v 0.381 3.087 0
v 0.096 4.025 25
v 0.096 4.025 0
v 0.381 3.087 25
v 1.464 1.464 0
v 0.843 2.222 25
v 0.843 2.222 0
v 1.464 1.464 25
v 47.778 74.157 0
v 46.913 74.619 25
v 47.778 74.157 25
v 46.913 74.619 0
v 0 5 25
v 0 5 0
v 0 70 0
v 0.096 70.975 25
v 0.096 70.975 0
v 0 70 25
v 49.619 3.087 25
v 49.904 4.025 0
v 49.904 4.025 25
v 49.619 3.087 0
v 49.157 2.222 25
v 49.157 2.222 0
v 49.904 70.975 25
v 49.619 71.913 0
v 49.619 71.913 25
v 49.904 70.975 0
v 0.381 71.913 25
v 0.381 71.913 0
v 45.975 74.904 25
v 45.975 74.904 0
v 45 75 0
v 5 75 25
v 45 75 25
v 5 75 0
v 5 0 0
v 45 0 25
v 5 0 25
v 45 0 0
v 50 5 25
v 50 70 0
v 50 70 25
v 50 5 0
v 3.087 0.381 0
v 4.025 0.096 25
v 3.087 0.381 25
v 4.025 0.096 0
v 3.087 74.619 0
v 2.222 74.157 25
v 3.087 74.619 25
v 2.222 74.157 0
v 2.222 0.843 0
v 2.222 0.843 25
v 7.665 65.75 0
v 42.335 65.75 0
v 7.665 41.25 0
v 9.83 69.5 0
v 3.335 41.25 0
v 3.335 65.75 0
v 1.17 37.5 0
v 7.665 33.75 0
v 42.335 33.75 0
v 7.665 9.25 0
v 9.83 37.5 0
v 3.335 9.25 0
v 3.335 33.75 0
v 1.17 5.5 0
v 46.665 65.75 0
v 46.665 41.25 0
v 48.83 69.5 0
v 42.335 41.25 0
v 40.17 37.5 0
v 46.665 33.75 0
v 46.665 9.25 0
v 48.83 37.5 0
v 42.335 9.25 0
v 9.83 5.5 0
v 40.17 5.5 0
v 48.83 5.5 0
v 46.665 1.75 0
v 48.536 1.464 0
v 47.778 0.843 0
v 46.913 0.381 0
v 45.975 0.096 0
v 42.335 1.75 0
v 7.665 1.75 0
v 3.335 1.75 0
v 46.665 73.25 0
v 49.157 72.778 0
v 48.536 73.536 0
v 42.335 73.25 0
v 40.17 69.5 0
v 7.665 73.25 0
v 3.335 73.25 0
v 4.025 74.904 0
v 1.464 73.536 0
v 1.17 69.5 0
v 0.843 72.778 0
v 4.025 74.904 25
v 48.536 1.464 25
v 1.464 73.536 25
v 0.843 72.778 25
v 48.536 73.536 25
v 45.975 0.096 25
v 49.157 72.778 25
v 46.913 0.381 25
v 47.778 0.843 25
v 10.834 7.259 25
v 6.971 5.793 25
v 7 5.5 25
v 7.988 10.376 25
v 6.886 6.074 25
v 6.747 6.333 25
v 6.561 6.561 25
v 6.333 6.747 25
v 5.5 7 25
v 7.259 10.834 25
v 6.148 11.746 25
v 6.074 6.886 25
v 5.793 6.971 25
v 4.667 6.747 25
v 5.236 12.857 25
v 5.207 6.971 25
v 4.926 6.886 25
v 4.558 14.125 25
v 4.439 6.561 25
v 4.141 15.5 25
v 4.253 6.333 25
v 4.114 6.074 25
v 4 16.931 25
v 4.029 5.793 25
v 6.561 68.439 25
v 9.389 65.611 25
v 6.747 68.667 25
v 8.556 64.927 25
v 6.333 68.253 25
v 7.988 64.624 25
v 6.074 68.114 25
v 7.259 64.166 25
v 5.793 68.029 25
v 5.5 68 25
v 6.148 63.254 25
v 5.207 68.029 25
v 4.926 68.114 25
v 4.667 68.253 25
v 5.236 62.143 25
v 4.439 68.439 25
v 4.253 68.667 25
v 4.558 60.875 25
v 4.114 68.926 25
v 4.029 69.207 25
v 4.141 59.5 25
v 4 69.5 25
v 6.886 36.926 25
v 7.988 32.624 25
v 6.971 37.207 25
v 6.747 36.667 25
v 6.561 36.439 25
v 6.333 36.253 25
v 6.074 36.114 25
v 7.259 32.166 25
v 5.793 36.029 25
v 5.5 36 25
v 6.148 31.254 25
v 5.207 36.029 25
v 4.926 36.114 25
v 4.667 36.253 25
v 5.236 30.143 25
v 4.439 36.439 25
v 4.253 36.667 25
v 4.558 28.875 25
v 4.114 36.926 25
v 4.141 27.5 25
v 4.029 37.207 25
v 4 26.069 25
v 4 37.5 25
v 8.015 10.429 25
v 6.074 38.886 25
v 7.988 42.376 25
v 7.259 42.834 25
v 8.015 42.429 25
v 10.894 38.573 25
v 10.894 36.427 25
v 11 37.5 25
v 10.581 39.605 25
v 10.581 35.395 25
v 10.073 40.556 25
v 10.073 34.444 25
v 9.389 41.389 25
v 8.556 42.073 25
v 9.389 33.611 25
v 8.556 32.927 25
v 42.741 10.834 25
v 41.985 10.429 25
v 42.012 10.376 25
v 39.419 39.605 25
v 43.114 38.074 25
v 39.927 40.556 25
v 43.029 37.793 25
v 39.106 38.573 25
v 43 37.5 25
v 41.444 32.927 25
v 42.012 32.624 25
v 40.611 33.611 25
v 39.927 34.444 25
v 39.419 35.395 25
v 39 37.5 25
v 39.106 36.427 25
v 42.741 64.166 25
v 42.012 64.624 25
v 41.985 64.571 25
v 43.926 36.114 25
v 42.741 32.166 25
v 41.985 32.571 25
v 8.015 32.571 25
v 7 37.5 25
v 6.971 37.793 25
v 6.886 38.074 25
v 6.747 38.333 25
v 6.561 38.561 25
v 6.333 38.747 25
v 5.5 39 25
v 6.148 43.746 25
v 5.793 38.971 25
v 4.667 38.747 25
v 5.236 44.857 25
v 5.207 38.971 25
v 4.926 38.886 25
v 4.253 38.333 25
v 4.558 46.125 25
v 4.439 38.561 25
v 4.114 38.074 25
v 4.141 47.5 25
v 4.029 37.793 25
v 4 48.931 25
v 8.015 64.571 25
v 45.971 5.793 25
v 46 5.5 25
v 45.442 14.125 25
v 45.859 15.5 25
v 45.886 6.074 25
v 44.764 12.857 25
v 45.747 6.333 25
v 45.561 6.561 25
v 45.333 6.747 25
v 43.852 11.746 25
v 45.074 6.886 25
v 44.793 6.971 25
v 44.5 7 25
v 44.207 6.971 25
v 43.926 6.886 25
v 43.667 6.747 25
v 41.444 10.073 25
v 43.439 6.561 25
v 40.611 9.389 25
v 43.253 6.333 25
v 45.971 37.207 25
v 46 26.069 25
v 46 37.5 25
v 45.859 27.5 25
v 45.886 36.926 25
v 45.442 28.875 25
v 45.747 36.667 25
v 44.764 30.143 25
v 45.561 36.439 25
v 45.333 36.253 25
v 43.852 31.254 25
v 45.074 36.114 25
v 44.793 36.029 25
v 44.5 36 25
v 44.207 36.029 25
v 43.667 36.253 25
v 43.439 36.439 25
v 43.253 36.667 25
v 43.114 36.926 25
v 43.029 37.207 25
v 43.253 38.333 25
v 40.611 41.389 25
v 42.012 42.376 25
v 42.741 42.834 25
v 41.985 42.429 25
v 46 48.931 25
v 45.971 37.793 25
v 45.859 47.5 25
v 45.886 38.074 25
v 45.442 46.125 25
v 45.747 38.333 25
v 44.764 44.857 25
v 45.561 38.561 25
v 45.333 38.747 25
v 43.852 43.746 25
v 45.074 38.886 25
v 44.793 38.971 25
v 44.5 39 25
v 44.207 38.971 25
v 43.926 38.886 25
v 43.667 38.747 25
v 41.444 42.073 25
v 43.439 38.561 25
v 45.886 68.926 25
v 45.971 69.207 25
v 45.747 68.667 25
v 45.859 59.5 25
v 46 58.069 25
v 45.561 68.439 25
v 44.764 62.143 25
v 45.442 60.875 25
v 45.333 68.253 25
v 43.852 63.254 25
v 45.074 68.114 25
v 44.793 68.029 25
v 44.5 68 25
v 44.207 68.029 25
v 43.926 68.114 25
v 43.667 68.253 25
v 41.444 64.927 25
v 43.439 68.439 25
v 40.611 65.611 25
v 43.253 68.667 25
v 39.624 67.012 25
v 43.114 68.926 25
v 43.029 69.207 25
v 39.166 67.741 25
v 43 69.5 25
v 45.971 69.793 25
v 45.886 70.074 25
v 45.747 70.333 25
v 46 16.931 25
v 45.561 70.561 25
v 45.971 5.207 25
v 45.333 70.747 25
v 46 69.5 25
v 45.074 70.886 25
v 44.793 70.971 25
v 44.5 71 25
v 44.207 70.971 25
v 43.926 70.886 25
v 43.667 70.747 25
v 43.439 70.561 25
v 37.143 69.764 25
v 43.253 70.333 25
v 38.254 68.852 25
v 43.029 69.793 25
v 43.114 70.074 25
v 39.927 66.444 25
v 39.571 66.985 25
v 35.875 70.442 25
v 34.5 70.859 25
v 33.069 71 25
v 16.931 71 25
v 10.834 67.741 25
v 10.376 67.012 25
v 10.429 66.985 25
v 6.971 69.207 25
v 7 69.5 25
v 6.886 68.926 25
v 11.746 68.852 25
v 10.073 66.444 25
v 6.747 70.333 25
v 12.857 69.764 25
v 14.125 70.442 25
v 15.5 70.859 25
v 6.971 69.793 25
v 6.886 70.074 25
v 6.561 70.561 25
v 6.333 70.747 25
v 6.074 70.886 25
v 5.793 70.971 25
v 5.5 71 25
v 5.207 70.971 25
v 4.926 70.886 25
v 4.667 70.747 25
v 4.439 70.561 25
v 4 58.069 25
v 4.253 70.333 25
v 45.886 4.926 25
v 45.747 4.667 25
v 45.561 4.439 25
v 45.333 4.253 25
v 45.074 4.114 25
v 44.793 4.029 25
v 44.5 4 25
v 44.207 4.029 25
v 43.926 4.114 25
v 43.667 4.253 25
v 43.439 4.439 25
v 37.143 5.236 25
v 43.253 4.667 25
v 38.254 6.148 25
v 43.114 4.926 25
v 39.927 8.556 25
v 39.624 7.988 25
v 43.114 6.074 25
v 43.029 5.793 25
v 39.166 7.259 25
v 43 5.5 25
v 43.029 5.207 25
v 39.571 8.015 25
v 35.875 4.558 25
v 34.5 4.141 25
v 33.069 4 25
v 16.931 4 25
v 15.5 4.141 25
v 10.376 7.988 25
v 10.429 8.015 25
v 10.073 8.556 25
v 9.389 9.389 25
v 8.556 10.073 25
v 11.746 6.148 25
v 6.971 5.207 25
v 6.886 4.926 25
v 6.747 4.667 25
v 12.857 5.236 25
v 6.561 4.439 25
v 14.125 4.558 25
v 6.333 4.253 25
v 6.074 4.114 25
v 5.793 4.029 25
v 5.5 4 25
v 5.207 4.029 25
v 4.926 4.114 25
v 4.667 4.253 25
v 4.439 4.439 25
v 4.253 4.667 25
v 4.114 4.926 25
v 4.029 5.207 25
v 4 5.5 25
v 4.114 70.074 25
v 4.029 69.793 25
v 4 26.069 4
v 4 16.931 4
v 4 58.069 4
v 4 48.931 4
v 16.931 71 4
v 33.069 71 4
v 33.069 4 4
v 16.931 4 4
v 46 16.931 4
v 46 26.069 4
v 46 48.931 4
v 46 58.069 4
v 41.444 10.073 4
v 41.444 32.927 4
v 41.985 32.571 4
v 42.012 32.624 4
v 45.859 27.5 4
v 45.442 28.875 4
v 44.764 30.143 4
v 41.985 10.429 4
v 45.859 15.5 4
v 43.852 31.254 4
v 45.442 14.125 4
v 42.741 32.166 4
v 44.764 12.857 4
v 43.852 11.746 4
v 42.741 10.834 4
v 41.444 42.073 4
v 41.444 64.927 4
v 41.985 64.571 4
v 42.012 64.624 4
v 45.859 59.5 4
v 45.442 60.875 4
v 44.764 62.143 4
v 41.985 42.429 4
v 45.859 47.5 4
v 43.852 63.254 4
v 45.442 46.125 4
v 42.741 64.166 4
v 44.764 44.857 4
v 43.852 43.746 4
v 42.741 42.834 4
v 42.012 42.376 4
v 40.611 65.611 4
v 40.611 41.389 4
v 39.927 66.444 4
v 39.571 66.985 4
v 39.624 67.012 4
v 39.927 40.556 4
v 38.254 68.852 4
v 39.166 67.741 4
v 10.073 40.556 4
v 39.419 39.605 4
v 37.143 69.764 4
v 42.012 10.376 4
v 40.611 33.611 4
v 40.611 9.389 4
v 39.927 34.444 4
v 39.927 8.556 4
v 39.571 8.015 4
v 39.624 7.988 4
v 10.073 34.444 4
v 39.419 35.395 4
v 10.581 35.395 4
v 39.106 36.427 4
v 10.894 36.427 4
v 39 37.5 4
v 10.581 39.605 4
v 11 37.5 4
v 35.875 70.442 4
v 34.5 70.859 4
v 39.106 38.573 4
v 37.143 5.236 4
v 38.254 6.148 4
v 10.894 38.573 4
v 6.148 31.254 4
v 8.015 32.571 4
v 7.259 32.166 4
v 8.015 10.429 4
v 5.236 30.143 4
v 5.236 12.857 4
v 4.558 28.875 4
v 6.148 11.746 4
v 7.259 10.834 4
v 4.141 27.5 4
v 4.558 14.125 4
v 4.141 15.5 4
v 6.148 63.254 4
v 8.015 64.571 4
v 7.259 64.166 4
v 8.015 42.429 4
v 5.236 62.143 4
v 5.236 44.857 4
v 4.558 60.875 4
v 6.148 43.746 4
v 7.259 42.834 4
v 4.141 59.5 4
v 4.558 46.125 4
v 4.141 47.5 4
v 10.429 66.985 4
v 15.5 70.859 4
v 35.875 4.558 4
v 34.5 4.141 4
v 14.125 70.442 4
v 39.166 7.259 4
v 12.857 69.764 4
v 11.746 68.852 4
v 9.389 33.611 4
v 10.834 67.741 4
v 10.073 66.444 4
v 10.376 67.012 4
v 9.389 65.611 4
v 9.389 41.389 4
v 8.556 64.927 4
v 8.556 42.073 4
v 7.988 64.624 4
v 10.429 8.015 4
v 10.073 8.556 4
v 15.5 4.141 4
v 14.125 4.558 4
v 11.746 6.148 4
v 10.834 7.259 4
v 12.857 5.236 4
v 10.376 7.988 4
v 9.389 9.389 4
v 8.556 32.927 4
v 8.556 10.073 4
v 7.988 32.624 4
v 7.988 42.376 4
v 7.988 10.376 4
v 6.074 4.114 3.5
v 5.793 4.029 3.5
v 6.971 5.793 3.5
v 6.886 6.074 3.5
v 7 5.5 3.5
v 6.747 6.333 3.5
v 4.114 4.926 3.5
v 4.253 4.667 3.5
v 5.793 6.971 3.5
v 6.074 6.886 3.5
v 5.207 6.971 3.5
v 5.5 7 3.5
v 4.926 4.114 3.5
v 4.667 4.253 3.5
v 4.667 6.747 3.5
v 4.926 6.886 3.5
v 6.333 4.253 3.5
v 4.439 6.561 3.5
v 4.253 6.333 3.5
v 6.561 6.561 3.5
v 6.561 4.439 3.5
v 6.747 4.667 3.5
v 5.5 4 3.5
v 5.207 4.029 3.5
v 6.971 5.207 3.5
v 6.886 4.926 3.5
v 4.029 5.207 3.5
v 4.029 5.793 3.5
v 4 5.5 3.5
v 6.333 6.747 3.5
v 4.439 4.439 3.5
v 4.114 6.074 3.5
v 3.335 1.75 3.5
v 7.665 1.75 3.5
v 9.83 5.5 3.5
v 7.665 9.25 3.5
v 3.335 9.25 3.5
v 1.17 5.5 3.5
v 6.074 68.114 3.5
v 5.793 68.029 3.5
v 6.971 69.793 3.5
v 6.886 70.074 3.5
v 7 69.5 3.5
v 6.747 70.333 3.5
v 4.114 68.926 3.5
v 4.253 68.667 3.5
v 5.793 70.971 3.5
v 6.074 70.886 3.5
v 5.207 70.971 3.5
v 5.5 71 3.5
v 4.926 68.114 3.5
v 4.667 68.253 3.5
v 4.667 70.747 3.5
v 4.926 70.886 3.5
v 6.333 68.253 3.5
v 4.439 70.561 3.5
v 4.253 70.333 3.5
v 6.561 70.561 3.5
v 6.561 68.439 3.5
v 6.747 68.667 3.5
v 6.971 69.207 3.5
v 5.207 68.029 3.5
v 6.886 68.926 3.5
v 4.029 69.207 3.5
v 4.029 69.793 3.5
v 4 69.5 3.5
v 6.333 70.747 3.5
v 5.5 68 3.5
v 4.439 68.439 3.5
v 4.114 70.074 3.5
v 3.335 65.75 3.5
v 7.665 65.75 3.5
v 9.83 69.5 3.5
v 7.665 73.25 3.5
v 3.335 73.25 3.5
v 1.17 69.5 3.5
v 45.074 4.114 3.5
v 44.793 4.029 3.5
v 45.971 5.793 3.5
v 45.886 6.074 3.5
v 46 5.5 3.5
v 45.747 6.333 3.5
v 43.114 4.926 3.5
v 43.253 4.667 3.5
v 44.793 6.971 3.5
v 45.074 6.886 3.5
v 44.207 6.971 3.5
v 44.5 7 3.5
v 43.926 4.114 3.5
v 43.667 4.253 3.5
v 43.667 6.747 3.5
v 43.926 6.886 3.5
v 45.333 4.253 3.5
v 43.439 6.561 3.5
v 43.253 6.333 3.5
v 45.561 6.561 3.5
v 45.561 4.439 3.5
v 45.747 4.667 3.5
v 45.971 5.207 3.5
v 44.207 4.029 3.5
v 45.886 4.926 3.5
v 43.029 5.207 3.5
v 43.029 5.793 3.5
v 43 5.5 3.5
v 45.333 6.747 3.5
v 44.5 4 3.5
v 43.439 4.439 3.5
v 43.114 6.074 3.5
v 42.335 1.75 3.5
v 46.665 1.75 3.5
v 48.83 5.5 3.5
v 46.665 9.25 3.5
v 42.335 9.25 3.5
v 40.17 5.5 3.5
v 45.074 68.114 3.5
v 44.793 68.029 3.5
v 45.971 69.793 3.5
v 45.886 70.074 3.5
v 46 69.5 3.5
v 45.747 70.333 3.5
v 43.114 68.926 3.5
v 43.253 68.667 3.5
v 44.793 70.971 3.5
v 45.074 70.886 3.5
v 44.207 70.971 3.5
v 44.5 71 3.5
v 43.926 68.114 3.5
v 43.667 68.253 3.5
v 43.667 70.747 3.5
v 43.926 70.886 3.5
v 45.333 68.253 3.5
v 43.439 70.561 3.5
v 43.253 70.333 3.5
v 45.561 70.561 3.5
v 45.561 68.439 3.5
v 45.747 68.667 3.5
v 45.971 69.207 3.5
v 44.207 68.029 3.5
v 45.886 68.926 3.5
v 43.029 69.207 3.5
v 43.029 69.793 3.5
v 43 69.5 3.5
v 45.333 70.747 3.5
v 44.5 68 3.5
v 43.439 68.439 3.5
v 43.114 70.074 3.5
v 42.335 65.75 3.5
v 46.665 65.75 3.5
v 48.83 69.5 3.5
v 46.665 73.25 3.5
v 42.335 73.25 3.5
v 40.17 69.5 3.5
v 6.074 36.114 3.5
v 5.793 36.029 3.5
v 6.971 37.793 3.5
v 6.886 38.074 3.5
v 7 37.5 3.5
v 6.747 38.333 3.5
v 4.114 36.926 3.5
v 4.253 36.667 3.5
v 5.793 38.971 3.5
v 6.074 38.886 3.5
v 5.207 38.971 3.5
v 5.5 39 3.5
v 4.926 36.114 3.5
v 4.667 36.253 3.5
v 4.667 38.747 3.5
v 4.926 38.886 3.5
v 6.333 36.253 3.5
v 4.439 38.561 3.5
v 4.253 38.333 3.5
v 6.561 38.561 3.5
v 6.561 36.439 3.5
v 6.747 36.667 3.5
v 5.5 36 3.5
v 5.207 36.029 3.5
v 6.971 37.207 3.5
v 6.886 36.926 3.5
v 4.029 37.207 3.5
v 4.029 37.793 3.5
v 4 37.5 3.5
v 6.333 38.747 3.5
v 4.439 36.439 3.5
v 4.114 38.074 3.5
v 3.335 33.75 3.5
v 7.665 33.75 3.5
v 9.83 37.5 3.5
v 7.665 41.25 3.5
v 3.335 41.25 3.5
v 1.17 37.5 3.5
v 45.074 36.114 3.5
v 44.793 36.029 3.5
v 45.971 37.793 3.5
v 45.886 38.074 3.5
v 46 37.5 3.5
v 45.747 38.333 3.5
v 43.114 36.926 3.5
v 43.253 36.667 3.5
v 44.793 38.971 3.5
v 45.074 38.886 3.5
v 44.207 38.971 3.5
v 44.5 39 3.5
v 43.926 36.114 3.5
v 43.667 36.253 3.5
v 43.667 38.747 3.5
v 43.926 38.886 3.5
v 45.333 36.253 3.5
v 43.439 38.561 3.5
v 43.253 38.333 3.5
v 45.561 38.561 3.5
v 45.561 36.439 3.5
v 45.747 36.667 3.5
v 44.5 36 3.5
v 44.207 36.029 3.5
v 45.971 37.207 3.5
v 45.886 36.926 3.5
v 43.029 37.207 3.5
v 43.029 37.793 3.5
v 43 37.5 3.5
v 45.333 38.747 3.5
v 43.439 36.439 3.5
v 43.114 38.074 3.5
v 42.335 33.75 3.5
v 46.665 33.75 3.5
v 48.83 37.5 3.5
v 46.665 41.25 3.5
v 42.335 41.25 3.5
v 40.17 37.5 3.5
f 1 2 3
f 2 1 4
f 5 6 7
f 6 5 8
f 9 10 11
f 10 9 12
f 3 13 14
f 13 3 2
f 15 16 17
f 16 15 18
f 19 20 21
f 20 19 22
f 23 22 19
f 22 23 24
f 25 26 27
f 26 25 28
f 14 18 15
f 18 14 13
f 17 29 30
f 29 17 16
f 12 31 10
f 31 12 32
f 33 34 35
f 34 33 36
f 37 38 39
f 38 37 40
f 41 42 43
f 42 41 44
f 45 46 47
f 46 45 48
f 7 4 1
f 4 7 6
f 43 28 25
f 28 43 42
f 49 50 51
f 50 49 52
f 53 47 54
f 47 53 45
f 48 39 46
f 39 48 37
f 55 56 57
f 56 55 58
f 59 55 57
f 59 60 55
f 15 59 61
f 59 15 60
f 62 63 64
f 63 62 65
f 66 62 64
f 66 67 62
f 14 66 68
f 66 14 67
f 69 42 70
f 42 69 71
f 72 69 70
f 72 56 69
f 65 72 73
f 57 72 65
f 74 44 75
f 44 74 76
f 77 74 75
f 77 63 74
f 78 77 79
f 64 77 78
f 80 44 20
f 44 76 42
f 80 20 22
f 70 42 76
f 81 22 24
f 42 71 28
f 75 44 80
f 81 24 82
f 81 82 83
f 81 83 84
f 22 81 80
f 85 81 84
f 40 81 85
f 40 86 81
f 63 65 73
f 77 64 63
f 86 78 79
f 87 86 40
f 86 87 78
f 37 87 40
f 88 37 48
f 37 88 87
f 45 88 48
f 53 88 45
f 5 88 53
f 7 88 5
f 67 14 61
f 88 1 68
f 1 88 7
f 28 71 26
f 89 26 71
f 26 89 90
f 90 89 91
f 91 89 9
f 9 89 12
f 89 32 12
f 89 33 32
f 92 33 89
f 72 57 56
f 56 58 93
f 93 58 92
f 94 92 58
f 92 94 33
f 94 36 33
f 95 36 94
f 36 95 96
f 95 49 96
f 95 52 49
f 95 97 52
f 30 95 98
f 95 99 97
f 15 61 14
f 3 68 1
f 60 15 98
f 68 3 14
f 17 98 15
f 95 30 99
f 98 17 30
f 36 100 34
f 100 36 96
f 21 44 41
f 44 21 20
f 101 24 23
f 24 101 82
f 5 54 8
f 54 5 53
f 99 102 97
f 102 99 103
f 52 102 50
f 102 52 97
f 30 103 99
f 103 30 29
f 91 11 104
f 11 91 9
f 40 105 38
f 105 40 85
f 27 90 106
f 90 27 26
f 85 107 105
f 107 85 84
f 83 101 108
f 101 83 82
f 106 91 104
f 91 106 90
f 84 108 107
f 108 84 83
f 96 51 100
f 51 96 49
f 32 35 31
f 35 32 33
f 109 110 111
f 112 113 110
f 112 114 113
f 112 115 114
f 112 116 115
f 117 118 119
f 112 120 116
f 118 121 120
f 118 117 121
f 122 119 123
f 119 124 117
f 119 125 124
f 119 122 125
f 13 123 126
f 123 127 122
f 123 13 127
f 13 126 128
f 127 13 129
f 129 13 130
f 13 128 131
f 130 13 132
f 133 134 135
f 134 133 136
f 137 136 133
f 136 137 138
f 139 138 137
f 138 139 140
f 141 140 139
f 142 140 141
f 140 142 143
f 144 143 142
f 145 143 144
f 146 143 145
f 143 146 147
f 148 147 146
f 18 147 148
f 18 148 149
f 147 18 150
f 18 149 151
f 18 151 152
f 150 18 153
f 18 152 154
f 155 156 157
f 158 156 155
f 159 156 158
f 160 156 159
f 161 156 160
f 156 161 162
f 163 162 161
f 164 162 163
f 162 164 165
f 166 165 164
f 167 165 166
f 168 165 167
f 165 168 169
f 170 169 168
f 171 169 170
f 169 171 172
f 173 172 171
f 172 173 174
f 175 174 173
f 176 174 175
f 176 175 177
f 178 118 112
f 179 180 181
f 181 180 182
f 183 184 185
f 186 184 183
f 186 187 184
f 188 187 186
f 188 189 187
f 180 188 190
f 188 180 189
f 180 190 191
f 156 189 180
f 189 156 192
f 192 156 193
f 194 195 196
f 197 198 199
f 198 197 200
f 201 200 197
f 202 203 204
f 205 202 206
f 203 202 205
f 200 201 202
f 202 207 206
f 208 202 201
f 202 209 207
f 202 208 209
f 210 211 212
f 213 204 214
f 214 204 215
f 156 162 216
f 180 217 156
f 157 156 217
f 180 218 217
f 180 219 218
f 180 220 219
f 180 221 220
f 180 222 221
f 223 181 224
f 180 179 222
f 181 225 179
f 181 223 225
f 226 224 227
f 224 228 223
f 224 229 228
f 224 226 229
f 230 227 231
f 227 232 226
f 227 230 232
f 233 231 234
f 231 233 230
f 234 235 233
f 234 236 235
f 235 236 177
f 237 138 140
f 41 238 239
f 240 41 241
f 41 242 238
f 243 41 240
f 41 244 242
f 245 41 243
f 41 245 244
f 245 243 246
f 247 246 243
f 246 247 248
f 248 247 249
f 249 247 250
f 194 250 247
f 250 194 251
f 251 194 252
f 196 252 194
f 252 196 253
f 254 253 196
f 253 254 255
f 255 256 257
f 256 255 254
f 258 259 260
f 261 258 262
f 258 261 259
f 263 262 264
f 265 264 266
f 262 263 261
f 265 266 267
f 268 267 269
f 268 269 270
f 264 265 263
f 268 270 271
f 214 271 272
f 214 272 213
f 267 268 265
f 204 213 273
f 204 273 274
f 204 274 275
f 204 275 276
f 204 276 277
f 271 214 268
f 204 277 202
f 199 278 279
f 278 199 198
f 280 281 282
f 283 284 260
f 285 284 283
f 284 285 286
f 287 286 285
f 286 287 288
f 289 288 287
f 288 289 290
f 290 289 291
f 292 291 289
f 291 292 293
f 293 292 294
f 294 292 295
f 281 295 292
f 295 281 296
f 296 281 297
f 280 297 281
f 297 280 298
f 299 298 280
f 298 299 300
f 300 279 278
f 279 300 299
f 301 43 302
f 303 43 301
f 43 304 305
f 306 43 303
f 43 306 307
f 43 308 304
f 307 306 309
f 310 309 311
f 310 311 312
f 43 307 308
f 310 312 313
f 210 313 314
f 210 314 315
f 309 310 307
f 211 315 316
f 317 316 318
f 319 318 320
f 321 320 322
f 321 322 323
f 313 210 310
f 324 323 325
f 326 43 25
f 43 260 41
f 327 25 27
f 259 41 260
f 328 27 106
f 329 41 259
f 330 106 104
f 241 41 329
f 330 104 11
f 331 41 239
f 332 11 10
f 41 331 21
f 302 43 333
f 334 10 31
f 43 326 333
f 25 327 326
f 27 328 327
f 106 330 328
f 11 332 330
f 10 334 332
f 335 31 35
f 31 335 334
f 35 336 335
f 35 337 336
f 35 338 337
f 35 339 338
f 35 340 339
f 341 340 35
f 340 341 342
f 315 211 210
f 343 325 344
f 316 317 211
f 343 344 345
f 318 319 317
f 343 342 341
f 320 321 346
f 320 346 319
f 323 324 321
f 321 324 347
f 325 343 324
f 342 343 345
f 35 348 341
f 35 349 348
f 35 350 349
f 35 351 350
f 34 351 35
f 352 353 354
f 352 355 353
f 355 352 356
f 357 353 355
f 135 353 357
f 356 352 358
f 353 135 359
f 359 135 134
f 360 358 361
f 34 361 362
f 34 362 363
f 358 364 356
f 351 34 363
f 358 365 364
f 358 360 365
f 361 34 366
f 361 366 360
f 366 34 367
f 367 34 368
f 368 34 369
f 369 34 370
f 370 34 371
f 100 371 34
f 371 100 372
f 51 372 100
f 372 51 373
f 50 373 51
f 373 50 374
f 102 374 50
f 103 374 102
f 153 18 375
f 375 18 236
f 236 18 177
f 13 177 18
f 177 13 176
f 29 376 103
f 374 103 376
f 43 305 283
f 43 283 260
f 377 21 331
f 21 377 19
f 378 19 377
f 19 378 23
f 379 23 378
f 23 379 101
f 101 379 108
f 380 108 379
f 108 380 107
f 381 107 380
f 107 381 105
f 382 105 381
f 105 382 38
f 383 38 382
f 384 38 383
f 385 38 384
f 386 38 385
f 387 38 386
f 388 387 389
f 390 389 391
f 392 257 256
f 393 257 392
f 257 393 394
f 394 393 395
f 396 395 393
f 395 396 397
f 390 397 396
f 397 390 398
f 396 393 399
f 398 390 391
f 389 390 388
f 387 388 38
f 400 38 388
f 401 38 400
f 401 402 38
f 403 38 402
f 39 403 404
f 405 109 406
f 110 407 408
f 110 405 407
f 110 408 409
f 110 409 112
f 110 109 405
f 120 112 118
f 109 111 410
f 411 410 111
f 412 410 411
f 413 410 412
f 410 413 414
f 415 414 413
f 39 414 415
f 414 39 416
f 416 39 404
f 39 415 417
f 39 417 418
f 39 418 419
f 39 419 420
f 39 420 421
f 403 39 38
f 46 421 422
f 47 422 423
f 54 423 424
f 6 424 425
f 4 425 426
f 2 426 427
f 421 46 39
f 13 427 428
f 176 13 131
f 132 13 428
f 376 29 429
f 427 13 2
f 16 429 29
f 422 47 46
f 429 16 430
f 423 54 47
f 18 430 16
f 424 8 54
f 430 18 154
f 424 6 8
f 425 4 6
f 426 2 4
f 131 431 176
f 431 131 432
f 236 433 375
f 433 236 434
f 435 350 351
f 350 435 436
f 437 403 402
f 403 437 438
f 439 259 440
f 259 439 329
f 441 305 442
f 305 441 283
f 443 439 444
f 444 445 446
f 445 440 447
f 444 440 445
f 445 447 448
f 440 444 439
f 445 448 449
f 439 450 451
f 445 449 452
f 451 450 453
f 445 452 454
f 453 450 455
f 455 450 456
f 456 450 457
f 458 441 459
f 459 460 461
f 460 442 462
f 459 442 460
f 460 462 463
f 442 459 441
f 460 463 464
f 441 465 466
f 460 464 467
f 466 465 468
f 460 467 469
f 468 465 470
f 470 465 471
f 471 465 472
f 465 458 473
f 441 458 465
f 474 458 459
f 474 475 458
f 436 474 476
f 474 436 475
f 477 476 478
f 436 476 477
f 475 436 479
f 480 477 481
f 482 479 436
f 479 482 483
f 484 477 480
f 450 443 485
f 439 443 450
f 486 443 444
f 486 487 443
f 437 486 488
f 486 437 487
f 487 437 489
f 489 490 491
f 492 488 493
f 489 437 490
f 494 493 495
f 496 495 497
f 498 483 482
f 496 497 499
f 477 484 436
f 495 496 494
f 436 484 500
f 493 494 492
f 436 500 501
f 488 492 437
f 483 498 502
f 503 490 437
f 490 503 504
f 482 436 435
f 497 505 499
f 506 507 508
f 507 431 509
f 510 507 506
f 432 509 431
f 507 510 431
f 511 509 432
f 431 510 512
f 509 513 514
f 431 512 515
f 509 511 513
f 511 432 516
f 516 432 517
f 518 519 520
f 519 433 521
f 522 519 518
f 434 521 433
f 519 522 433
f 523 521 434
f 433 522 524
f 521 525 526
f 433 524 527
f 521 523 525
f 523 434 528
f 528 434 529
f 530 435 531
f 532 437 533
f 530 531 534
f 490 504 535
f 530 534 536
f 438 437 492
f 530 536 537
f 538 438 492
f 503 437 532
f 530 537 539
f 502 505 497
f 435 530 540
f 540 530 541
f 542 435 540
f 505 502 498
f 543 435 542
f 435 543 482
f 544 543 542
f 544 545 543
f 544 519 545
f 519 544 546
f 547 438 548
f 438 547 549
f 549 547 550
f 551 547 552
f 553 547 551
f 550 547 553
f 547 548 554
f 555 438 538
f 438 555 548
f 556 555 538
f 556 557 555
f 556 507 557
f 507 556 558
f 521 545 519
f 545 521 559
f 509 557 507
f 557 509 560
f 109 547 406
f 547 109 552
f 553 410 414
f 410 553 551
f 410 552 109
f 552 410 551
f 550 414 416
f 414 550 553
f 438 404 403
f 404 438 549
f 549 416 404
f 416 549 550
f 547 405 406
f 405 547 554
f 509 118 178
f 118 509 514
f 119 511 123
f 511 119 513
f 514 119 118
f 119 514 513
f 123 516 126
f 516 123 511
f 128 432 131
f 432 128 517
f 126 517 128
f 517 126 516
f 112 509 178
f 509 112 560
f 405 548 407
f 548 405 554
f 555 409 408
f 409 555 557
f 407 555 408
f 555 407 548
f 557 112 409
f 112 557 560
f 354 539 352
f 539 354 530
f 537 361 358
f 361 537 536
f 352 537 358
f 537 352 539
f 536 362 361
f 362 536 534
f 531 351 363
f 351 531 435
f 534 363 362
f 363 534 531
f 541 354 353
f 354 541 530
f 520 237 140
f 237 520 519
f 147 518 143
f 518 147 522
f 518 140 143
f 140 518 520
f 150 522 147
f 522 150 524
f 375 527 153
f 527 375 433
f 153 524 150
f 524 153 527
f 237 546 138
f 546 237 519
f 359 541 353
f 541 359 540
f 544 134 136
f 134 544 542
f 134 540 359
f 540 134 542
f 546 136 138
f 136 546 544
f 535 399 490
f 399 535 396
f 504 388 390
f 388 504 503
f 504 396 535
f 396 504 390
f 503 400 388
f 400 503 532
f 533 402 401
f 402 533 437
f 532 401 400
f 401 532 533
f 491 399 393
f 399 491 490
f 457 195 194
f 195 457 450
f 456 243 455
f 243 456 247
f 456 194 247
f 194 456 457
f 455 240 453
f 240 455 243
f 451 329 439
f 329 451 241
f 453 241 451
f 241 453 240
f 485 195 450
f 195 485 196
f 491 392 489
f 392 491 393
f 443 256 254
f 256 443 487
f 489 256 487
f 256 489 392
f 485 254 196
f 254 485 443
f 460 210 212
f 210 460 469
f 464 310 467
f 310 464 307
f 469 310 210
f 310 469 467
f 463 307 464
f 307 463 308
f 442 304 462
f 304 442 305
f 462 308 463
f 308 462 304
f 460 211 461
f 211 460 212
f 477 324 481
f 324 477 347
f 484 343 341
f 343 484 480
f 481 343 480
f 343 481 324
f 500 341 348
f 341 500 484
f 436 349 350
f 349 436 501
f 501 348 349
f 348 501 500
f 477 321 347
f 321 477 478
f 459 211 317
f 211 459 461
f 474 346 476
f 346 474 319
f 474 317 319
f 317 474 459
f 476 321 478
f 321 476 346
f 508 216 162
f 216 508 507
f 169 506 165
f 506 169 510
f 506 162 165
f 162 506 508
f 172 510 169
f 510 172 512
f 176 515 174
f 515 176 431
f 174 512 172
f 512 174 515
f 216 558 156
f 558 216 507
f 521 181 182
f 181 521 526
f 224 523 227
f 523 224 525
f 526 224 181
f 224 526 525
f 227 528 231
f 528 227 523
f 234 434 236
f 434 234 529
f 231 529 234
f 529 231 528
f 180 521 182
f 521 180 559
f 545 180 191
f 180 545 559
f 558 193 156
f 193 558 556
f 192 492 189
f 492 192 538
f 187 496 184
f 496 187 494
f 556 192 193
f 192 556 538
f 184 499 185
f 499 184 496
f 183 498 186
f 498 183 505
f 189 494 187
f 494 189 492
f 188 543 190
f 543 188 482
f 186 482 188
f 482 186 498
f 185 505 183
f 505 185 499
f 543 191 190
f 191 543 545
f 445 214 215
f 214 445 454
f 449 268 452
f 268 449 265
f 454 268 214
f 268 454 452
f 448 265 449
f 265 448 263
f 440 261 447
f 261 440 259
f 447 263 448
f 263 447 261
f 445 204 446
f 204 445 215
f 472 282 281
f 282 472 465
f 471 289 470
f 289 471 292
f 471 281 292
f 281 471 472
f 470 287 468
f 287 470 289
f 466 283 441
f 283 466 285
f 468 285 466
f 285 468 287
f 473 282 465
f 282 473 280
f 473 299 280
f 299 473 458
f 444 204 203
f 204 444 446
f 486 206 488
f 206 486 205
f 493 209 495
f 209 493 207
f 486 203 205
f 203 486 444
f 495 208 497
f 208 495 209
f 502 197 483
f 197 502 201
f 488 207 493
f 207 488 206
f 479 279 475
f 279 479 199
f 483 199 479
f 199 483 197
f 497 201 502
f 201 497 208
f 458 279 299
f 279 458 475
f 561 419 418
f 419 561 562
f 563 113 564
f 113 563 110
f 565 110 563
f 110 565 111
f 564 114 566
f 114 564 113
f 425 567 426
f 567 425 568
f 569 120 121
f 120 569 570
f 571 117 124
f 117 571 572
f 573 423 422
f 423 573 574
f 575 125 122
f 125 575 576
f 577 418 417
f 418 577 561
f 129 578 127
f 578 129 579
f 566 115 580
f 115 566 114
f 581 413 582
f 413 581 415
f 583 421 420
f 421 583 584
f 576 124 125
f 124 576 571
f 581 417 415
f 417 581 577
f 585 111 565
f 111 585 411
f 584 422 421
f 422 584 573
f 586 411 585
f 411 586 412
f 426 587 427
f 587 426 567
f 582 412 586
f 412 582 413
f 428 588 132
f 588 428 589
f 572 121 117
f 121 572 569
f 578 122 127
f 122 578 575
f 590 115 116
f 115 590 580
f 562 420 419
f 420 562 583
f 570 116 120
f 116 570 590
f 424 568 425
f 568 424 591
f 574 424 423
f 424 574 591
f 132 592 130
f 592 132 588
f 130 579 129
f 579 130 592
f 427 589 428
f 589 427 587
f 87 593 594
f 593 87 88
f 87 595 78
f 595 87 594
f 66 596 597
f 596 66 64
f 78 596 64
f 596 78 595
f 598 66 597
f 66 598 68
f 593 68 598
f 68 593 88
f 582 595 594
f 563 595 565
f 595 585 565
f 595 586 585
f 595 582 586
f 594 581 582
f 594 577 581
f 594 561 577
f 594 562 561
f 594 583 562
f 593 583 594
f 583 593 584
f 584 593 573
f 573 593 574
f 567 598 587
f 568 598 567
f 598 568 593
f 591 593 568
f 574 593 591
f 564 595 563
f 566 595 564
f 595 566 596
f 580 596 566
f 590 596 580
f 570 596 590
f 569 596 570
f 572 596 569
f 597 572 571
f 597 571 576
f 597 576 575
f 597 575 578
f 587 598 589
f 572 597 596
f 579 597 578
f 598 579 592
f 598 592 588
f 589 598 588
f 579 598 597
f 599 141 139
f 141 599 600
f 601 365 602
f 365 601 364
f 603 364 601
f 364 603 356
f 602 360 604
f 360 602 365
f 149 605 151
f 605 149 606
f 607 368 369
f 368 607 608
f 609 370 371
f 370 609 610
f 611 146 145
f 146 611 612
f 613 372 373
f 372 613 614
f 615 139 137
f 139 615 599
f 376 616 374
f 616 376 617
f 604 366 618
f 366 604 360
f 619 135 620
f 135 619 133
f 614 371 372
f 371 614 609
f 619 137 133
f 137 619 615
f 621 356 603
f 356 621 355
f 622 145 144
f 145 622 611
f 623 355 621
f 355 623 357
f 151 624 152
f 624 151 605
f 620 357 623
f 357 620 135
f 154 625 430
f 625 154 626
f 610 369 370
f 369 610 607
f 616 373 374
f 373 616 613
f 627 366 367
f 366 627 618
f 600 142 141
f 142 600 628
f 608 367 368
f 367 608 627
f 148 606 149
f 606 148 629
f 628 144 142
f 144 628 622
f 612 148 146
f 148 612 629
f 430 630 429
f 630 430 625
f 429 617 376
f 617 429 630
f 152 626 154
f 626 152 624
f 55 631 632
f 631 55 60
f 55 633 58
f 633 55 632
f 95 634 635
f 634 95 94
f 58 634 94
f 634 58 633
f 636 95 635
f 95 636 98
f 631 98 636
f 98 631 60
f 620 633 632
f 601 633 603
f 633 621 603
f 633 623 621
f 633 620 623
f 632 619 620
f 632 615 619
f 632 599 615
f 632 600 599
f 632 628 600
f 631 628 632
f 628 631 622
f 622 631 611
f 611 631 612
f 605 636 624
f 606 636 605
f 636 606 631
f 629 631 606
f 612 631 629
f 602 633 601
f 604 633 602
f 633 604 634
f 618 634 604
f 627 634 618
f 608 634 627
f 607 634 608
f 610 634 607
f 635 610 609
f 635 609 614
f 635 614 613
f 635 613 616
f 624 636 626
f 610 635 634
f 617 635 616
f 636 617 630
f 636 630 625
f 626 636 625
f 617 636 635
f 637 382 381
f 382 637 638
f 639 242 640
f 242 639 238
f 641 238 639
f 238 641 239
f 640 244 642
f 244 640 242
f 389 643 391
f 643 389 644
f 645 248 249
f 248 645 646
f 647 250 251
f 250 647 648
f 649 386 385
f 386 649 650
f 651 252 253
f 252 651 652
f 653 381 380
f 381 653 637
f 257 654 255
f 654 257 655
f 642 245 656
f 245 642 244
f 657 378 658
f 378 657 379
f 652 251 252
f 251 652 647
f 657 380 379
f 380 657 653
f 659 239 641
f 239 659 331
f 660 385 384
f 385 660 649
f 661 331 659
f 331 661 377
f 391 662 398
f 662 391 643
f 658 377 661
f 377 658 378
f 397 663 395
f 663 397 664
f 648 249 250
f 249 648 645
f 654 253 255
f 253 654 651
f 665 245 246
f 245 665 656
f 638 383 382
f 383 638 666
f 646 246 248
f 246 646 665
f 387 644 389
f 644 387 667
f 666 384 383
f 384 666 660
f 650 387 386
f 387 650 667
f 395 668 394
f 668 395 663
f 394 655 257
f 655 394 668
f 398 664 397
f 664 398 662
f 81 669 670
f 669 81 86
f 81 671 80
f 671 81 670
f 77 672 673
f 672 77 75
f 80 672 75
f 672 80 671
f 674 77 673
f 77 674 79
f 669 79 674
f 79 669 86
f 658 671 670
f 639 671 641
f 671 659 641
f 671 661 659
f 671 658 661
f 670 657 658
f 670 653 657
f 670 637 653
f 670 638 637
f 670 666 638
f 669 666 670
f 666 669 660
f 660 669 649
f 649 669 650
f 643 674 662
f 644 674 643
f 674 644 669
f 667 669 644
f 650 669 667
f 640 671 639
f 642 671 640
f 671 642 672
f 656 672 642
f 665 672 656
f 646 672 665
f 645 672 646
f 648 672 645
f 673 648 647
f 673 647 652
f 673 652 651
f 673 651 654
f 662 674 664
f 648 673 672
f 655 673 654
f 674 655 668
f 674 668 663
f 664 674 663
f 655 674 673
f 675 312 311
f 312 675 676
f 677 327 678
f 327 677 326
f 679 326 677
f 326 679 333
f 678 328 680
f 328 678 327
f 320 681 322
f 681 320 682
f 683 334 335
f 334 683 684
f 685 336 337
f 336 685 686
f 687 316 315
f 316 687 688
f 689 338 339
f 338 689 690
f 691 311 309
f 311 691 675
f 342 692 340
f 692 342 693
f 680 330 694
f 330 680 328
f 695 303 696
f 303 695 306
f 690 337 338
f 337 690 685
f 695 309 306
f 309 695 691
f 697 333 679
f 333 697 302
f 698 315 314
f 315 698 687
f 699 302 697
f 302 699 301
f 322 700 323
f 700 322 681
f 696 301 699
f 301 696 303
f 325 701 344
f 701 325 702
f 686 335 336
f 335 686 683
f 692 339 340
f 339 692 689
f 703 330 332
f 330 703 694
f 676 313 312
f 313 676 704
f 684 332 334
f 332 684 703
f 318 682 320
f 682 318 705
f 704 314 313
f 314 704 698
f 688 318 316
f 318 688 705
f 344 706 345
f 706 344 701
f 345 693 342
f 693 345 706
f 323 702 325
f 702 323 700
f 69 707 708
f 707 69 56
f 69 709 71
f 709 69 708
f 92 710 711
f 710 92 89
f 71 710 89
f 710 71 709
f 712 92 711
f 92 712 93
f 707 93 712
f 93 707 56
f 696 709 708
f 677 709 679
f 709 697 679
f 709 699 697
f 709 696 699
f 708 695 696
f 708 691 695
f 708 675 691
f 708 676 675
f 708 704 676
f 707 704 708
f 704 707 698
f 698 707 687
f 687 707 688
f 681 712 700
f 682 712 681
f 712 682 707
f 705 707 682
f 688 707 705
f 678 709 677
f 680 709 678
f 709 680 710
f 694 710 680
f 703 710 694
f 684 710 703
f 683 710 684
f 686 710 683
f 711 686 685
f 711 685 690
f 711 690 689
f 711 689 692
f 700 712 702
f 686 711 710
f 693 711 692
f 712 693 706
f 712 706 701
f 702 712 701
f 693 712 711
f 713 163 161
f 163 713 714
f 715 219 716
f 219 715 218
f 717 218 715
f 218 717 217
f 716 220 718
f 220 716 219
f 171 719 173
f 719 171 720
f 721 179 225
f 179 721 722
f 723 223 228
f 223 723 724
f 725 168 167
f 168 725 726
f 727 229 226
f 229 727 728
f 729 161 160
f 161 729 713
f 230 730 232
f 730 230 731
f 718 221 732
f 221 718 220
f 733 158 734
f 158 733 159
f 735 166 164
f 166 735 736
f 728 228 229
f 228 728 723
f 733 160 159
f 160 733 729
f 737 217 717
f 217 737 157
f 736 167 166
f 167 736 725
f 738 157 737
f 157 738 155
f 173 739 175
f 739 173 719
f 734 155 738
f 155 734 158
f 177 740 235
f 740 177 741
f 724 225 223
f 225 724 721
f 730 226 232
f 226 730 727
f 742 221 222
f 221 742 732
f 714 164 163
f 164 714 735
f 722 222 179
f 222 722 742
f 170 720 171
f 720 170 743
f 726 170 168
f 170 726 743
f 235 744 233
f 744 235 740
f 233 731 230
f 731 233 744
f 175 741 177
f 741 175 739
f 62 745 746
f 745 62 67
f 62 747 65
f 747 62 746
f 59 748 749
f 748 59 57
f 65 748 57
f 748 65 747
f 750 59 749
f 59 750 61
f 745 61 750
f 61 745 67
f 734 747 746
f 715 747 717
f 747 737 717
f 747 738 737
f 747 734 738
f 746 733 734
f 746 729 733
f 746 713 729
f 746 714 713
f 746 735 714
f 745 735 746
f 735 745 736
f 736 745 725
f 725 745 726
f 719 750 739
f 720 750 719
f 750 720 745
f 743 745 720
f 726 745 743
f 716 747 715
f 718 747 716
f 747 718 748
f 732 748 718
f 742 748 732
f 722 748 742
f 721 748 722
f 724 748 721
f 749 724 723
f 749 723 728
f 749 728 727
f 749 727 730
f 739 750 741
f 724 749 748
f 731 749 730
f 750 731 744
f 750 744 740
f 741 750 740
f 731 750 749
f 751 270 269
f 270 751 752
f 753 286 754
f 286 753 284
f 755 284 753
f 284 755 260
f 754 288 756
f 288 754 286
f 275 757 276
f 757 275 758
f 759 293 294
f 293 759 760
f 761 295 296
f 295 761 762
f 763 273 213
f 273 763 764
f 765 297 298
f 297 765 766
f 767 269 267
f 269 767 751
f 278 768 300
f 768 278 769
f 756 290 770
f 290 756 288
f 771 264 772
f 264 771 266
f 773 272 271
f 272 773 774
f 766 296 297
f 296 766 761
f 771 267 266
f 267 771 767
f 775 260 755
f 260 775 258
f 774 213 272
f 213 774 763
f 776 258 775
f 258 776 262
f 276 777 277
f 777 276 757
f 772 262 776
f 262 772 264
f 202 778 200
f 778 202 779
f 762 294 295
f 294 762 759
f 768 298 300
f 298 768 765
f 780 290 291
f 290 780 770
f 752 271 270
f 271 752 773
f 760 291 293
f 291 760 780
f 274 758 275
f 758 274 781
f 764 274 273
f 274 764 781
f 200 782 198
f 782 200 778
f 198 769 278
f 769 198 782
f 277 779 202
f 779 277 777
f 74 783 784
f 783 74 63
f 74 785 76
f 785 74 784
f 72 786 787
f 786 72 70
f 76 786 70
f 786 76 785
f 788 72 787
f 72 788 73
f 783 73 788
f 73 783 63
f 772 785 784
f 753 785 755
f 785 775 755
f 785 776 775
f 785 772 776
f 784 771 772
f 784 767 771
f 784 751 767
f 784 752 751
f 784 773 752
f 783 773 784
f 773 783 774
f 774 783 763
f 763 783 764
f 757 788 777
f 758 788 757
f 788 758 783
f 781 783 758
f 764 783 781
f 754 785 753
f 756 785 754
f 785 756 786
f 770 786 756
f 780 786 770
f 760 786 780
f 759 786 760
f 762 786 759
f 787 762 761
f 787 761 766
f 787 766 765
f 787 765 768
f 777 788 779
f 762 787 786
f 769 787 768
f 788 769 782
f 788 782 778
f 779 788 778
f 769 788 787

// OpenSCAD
// file: filleted_cylinder.scad
/**
Copyright 2023 - Harry Joseph Braviner
For permission to use please contact me by e-mail.

Creates filleted cylinders for smooth blending into flat surfaces.
*/

EPS=0.001;
$fn=32;

module filleted_cylinder(
    r,
    h,
    x1,
    x2,
    angle=180,
) {
    // Create the fillet
    module fillet() {
        theta = acos((x2 - r)/r);  // Angle from y-axis of point where fillet is tangent to cylinder
        r2 = ((1 + cos(theta))*r - x1) / (1 - cos(theta));  // Radius of the cylinder the fillet will be made from
        translate([(r+r2)*sin(theta), r + (r+r2)*cos(theta), 0.5*h])
        difference() {
            cylinder(r=r2+2*r+EPS, h=h, center=true);
            union() {
                cylinder(r=r2, h=h+2*EPS, center=true);
                
                translate([0.0, -0.5*(r2 + 2*r) -0.5*EPS - r2 - EPS, 0.0])
                cube([2*(2*r+r2)+2*EPS, r2 + 2*r + 2*EPS, h+2*EPS], center=true);
                
                translate([0.5*(r2 + 2*r + EPS), 0.0, 0.0])
                cube([r2 + 2*r + EPS, 2*(2*r+r2) + 2*EPS, h+2*EPS], center=true);
                
                translate([-0.5*(r2 + 2*r + EPS) - (r+r2)*sin(theta), 0.0, 0.0])
                cube([r2 + 2*r + EPS, 2*(2*r+r2) + 2*EPS, h+2*EPS], center=true);
                
                rotate([0.0, 0.0, -90 - theta])
                translate([0.0, -0.5*(r2 + 2*r + 2*EPS), 0.0])
                cube([2*(2*r+r2)+2*EPS, r2 + 2*r + 2*EPS, h+2*EPS], center=true);
            }
        }
    }
    
    cylinder(r=r, h=h, center=true);

    translate([0.0, -r, -0.5*h])
    fillet();

    rotate([0.0, 0.0, -180 + angle])
    translate([0.0, -r, -0.5*h])
    mirror([1.0, 0.0, 0.0])
    fillet();
}

// Demo

// Cylinder on a flat part
translate([0.0, -0.5*10.0, 0.0])
cube([45.0, 10.0, 2.0], center=true);
translate([0.0, 10.0 - 3.0, 0.0])
filleted_cylinder(r=10.0, h=2.0, x1 = 3.0, x2=12.0, angle=180);

//Cylinder in a 90 degree corner
translate([100.0, 0.0, 0.0]) {
    translate([0.25*60.0 - 0.5*10.0, -0.5*10.0, 0.0])
    cube([0.5*60.0 + 10.0, 10.0, 2.0], center=true);
    
    rotate([0.0, 0.0, -90.0])
    translate([-0.25*60.0 + 0.5*10.0, -0.5*10.0, 0.0])
    cube([0.5*60.0 + 10.0, 10.0, 2.0], center=true);
    
    translate([10.0 - 3.0, 10.0 - 3.0, 0.0])
    filleted_cylinder(r=10.0, h=2.0, x1 = 3.0, x2=12.0, angle=90);
}
// main file
/**
Copyright 2023 - Harry Joseph Braviner
For permission to use please contact me by e-mail.

Purpose of this module is to allow fast parametric creation
of basic boxes. Useful for e.g. button-boxes for flight
simulators.
*/

use <filleted_cylinder.scad>

// Internal parameters
EPS = 0.001;  // Used to avoid zero-width surfaces
              // and touching-but-disconnected surfaces.

$fn=32;

module box_base(
    w, l, d,  // Exterior dimensions of the box
    r_corner,  // Rounding radius of the box corners
    d_bolt,  // Diameter of the bolts holding the top on
    d_nut,  // Flat-to-flat diameter of the nuts
    h_nut,  // Height of the nuts (plus and clearance)
    wall_thickness,  // Wall thickness of the box and lid
    w_extra_holes=0, // Number of non-corner holes on width
    l_extra_holes=0, // Number of non-corner holes on length
) {
    // Submodule that we will use twice.
    // Once for the outer box shape, once for the inner
    // shape to be subtracted
    module rounded_box(w, l, d, r_corner) {
        r = r_corner;  // Save some typing
        if (r > 0.0) {
            linear_extrude(height=d, center=false)
            hull() {
                translate([r, r, 0])
                    circle(r=r);
                translate([w - r, r, 0])
                    circle(r=r);
                translate([r, l - r, 0])
                    circle(r=r);
                translate([w - r, l - r, 0])
                    circle(r=r);
            }
        } else {
            cube([w, l, d]);
        }
    }
    
    module nut_on_base(x, y) {
        r = 0.5*d_nut / cos(30);
        translate([x, y, 0.5*h_nut - 0.5*EPS])
        cylinder(r=r, h=h_nut + EPS, $fn=6, center=true);
    }

    difference() {
        // Used for bolt hole positioning
        r_bolt_outer = 0.5*d_bolt + wall_thickness;
        
        // Positive part
        union() {
            // Create the hollow box
            difference() {
                rounded_box(w, l, d, r_corner);
                translate([wall_thickness, wall_thickness, wall_thickness])
                rounded_box(w-2*wall_thickness, l-2*wall_thickness, d - wall_thickness + EPS, r_corner - wall_thickness);
            }
            
            // Create the corner hole structures
            for (right = [0, 1]) {
                for (top = [0, 1]) {
                    x = right*w + (1-2*right)*r_bolt_outer;
                    y = top*l + (1-2*top)*r_bolt_outer;
                    translate([x, y, 0.5*d])
                    mirror([right, top, 0.0])
                    filleted_cylinder(r=r_bolt_outer, h=d,
                        x1=wall_thickness, x2=2.0*wall_thickness,
                        angle=90);
                }
            }
            
            // Create hole structures on width
            if (w_extra_holes > 0) {
                for (top = [0, 1]) {
                    for (i = [1:w_extra_holes]) {
                        x = i*w/(w_extra_holes + 1);
                        y = top*l + (1-2*top)*r_bolt_outer;
                    translate([x, y, 0.5*d])
                    mirror([0, top, 0.0])
                    filleted_cylinder(r=r_bolt_outer, h=d,
                        x1=wall_thickness, x2=2.0*wall_thickness,
                        angle=180);
                    }
                }
            }
            
            // Create hole structures on length
            if (l_extra_holes > 0) {
                for (right = [0, 1]) {
                    for (i = [1:l_extra_holes]) {
                        x = right*w + (1-2*right)*r_bolt_outer;
                        y = i*l/(l_extra_holes + 1);
                    translate([x, y, 0.5*d])
                    mirror([right, 0, 0.0])
                    rotate([0, 0, -90])
                    filleted_cylinder(r=r_bolt_outer, h=d,
                        x1=wall_thickness, x2=2.0*wall_thickness,
                        angle=180);
                    }
                }
            }
        }
        
        // Negative part
        union() {
            // Create the corner holes themselves
            for (right = [0, 1]) {
                for (top = [0, 1]) {
                    x = right*w + (1-2*right)*r_bolt_outer;
                    y = top*l + (1-2*top)*r_bolt_outer;
                    translate([x, y, 0.5*d + EPS])
                    cylinder(r=0.5*d_bolt, h=d+2*EPS, center=true);

                    nut_on_base(x, y);
                }
            }
            
            // Create holes on width
            if (w_extra_holes > 0) {
                for (top = [0, 1]) {
                    for (i = [1:w_extra_holes]) {
                        x = i*w/(w_extra_holes + 1);
                        y = top*l + (1-2*top)*r_bolt_outer;
                        translate([x, y, 0.5*d + EPS])
                        cylinder(r=0.5*d_bolt, h=d+2*EPS, center=true);

                        nut_on_base(x, y);
                    }
                }
            }
            
            // Create hole structures on length
            if (l_extra_holes > 0) {
                for (right = [0, 1]) {
                    for (i = [1:l_extra_holes]) {
                        x = right*w + (1-2*right)*r_bolt_outer;
                        y = i*l/(l_extra_holes + 1);
                        translate([x, y, 0.5*d + EPS])
                        cylinder(r=0.5*d_bolt, h=d+2*EPS, center=true);

                        nut_on_base(x, y);
                    }
                }
            }
        }
    }
}

// Demonstration
box_base(w=50.0, l=75.0, d=25.0, r_corner=5.0,
    d_bolt=3.0, d_nut=7.5, h_nut=3.5,
    wall_thickness=4.0, w_extra_holes=0, l_extra_holes=1);
